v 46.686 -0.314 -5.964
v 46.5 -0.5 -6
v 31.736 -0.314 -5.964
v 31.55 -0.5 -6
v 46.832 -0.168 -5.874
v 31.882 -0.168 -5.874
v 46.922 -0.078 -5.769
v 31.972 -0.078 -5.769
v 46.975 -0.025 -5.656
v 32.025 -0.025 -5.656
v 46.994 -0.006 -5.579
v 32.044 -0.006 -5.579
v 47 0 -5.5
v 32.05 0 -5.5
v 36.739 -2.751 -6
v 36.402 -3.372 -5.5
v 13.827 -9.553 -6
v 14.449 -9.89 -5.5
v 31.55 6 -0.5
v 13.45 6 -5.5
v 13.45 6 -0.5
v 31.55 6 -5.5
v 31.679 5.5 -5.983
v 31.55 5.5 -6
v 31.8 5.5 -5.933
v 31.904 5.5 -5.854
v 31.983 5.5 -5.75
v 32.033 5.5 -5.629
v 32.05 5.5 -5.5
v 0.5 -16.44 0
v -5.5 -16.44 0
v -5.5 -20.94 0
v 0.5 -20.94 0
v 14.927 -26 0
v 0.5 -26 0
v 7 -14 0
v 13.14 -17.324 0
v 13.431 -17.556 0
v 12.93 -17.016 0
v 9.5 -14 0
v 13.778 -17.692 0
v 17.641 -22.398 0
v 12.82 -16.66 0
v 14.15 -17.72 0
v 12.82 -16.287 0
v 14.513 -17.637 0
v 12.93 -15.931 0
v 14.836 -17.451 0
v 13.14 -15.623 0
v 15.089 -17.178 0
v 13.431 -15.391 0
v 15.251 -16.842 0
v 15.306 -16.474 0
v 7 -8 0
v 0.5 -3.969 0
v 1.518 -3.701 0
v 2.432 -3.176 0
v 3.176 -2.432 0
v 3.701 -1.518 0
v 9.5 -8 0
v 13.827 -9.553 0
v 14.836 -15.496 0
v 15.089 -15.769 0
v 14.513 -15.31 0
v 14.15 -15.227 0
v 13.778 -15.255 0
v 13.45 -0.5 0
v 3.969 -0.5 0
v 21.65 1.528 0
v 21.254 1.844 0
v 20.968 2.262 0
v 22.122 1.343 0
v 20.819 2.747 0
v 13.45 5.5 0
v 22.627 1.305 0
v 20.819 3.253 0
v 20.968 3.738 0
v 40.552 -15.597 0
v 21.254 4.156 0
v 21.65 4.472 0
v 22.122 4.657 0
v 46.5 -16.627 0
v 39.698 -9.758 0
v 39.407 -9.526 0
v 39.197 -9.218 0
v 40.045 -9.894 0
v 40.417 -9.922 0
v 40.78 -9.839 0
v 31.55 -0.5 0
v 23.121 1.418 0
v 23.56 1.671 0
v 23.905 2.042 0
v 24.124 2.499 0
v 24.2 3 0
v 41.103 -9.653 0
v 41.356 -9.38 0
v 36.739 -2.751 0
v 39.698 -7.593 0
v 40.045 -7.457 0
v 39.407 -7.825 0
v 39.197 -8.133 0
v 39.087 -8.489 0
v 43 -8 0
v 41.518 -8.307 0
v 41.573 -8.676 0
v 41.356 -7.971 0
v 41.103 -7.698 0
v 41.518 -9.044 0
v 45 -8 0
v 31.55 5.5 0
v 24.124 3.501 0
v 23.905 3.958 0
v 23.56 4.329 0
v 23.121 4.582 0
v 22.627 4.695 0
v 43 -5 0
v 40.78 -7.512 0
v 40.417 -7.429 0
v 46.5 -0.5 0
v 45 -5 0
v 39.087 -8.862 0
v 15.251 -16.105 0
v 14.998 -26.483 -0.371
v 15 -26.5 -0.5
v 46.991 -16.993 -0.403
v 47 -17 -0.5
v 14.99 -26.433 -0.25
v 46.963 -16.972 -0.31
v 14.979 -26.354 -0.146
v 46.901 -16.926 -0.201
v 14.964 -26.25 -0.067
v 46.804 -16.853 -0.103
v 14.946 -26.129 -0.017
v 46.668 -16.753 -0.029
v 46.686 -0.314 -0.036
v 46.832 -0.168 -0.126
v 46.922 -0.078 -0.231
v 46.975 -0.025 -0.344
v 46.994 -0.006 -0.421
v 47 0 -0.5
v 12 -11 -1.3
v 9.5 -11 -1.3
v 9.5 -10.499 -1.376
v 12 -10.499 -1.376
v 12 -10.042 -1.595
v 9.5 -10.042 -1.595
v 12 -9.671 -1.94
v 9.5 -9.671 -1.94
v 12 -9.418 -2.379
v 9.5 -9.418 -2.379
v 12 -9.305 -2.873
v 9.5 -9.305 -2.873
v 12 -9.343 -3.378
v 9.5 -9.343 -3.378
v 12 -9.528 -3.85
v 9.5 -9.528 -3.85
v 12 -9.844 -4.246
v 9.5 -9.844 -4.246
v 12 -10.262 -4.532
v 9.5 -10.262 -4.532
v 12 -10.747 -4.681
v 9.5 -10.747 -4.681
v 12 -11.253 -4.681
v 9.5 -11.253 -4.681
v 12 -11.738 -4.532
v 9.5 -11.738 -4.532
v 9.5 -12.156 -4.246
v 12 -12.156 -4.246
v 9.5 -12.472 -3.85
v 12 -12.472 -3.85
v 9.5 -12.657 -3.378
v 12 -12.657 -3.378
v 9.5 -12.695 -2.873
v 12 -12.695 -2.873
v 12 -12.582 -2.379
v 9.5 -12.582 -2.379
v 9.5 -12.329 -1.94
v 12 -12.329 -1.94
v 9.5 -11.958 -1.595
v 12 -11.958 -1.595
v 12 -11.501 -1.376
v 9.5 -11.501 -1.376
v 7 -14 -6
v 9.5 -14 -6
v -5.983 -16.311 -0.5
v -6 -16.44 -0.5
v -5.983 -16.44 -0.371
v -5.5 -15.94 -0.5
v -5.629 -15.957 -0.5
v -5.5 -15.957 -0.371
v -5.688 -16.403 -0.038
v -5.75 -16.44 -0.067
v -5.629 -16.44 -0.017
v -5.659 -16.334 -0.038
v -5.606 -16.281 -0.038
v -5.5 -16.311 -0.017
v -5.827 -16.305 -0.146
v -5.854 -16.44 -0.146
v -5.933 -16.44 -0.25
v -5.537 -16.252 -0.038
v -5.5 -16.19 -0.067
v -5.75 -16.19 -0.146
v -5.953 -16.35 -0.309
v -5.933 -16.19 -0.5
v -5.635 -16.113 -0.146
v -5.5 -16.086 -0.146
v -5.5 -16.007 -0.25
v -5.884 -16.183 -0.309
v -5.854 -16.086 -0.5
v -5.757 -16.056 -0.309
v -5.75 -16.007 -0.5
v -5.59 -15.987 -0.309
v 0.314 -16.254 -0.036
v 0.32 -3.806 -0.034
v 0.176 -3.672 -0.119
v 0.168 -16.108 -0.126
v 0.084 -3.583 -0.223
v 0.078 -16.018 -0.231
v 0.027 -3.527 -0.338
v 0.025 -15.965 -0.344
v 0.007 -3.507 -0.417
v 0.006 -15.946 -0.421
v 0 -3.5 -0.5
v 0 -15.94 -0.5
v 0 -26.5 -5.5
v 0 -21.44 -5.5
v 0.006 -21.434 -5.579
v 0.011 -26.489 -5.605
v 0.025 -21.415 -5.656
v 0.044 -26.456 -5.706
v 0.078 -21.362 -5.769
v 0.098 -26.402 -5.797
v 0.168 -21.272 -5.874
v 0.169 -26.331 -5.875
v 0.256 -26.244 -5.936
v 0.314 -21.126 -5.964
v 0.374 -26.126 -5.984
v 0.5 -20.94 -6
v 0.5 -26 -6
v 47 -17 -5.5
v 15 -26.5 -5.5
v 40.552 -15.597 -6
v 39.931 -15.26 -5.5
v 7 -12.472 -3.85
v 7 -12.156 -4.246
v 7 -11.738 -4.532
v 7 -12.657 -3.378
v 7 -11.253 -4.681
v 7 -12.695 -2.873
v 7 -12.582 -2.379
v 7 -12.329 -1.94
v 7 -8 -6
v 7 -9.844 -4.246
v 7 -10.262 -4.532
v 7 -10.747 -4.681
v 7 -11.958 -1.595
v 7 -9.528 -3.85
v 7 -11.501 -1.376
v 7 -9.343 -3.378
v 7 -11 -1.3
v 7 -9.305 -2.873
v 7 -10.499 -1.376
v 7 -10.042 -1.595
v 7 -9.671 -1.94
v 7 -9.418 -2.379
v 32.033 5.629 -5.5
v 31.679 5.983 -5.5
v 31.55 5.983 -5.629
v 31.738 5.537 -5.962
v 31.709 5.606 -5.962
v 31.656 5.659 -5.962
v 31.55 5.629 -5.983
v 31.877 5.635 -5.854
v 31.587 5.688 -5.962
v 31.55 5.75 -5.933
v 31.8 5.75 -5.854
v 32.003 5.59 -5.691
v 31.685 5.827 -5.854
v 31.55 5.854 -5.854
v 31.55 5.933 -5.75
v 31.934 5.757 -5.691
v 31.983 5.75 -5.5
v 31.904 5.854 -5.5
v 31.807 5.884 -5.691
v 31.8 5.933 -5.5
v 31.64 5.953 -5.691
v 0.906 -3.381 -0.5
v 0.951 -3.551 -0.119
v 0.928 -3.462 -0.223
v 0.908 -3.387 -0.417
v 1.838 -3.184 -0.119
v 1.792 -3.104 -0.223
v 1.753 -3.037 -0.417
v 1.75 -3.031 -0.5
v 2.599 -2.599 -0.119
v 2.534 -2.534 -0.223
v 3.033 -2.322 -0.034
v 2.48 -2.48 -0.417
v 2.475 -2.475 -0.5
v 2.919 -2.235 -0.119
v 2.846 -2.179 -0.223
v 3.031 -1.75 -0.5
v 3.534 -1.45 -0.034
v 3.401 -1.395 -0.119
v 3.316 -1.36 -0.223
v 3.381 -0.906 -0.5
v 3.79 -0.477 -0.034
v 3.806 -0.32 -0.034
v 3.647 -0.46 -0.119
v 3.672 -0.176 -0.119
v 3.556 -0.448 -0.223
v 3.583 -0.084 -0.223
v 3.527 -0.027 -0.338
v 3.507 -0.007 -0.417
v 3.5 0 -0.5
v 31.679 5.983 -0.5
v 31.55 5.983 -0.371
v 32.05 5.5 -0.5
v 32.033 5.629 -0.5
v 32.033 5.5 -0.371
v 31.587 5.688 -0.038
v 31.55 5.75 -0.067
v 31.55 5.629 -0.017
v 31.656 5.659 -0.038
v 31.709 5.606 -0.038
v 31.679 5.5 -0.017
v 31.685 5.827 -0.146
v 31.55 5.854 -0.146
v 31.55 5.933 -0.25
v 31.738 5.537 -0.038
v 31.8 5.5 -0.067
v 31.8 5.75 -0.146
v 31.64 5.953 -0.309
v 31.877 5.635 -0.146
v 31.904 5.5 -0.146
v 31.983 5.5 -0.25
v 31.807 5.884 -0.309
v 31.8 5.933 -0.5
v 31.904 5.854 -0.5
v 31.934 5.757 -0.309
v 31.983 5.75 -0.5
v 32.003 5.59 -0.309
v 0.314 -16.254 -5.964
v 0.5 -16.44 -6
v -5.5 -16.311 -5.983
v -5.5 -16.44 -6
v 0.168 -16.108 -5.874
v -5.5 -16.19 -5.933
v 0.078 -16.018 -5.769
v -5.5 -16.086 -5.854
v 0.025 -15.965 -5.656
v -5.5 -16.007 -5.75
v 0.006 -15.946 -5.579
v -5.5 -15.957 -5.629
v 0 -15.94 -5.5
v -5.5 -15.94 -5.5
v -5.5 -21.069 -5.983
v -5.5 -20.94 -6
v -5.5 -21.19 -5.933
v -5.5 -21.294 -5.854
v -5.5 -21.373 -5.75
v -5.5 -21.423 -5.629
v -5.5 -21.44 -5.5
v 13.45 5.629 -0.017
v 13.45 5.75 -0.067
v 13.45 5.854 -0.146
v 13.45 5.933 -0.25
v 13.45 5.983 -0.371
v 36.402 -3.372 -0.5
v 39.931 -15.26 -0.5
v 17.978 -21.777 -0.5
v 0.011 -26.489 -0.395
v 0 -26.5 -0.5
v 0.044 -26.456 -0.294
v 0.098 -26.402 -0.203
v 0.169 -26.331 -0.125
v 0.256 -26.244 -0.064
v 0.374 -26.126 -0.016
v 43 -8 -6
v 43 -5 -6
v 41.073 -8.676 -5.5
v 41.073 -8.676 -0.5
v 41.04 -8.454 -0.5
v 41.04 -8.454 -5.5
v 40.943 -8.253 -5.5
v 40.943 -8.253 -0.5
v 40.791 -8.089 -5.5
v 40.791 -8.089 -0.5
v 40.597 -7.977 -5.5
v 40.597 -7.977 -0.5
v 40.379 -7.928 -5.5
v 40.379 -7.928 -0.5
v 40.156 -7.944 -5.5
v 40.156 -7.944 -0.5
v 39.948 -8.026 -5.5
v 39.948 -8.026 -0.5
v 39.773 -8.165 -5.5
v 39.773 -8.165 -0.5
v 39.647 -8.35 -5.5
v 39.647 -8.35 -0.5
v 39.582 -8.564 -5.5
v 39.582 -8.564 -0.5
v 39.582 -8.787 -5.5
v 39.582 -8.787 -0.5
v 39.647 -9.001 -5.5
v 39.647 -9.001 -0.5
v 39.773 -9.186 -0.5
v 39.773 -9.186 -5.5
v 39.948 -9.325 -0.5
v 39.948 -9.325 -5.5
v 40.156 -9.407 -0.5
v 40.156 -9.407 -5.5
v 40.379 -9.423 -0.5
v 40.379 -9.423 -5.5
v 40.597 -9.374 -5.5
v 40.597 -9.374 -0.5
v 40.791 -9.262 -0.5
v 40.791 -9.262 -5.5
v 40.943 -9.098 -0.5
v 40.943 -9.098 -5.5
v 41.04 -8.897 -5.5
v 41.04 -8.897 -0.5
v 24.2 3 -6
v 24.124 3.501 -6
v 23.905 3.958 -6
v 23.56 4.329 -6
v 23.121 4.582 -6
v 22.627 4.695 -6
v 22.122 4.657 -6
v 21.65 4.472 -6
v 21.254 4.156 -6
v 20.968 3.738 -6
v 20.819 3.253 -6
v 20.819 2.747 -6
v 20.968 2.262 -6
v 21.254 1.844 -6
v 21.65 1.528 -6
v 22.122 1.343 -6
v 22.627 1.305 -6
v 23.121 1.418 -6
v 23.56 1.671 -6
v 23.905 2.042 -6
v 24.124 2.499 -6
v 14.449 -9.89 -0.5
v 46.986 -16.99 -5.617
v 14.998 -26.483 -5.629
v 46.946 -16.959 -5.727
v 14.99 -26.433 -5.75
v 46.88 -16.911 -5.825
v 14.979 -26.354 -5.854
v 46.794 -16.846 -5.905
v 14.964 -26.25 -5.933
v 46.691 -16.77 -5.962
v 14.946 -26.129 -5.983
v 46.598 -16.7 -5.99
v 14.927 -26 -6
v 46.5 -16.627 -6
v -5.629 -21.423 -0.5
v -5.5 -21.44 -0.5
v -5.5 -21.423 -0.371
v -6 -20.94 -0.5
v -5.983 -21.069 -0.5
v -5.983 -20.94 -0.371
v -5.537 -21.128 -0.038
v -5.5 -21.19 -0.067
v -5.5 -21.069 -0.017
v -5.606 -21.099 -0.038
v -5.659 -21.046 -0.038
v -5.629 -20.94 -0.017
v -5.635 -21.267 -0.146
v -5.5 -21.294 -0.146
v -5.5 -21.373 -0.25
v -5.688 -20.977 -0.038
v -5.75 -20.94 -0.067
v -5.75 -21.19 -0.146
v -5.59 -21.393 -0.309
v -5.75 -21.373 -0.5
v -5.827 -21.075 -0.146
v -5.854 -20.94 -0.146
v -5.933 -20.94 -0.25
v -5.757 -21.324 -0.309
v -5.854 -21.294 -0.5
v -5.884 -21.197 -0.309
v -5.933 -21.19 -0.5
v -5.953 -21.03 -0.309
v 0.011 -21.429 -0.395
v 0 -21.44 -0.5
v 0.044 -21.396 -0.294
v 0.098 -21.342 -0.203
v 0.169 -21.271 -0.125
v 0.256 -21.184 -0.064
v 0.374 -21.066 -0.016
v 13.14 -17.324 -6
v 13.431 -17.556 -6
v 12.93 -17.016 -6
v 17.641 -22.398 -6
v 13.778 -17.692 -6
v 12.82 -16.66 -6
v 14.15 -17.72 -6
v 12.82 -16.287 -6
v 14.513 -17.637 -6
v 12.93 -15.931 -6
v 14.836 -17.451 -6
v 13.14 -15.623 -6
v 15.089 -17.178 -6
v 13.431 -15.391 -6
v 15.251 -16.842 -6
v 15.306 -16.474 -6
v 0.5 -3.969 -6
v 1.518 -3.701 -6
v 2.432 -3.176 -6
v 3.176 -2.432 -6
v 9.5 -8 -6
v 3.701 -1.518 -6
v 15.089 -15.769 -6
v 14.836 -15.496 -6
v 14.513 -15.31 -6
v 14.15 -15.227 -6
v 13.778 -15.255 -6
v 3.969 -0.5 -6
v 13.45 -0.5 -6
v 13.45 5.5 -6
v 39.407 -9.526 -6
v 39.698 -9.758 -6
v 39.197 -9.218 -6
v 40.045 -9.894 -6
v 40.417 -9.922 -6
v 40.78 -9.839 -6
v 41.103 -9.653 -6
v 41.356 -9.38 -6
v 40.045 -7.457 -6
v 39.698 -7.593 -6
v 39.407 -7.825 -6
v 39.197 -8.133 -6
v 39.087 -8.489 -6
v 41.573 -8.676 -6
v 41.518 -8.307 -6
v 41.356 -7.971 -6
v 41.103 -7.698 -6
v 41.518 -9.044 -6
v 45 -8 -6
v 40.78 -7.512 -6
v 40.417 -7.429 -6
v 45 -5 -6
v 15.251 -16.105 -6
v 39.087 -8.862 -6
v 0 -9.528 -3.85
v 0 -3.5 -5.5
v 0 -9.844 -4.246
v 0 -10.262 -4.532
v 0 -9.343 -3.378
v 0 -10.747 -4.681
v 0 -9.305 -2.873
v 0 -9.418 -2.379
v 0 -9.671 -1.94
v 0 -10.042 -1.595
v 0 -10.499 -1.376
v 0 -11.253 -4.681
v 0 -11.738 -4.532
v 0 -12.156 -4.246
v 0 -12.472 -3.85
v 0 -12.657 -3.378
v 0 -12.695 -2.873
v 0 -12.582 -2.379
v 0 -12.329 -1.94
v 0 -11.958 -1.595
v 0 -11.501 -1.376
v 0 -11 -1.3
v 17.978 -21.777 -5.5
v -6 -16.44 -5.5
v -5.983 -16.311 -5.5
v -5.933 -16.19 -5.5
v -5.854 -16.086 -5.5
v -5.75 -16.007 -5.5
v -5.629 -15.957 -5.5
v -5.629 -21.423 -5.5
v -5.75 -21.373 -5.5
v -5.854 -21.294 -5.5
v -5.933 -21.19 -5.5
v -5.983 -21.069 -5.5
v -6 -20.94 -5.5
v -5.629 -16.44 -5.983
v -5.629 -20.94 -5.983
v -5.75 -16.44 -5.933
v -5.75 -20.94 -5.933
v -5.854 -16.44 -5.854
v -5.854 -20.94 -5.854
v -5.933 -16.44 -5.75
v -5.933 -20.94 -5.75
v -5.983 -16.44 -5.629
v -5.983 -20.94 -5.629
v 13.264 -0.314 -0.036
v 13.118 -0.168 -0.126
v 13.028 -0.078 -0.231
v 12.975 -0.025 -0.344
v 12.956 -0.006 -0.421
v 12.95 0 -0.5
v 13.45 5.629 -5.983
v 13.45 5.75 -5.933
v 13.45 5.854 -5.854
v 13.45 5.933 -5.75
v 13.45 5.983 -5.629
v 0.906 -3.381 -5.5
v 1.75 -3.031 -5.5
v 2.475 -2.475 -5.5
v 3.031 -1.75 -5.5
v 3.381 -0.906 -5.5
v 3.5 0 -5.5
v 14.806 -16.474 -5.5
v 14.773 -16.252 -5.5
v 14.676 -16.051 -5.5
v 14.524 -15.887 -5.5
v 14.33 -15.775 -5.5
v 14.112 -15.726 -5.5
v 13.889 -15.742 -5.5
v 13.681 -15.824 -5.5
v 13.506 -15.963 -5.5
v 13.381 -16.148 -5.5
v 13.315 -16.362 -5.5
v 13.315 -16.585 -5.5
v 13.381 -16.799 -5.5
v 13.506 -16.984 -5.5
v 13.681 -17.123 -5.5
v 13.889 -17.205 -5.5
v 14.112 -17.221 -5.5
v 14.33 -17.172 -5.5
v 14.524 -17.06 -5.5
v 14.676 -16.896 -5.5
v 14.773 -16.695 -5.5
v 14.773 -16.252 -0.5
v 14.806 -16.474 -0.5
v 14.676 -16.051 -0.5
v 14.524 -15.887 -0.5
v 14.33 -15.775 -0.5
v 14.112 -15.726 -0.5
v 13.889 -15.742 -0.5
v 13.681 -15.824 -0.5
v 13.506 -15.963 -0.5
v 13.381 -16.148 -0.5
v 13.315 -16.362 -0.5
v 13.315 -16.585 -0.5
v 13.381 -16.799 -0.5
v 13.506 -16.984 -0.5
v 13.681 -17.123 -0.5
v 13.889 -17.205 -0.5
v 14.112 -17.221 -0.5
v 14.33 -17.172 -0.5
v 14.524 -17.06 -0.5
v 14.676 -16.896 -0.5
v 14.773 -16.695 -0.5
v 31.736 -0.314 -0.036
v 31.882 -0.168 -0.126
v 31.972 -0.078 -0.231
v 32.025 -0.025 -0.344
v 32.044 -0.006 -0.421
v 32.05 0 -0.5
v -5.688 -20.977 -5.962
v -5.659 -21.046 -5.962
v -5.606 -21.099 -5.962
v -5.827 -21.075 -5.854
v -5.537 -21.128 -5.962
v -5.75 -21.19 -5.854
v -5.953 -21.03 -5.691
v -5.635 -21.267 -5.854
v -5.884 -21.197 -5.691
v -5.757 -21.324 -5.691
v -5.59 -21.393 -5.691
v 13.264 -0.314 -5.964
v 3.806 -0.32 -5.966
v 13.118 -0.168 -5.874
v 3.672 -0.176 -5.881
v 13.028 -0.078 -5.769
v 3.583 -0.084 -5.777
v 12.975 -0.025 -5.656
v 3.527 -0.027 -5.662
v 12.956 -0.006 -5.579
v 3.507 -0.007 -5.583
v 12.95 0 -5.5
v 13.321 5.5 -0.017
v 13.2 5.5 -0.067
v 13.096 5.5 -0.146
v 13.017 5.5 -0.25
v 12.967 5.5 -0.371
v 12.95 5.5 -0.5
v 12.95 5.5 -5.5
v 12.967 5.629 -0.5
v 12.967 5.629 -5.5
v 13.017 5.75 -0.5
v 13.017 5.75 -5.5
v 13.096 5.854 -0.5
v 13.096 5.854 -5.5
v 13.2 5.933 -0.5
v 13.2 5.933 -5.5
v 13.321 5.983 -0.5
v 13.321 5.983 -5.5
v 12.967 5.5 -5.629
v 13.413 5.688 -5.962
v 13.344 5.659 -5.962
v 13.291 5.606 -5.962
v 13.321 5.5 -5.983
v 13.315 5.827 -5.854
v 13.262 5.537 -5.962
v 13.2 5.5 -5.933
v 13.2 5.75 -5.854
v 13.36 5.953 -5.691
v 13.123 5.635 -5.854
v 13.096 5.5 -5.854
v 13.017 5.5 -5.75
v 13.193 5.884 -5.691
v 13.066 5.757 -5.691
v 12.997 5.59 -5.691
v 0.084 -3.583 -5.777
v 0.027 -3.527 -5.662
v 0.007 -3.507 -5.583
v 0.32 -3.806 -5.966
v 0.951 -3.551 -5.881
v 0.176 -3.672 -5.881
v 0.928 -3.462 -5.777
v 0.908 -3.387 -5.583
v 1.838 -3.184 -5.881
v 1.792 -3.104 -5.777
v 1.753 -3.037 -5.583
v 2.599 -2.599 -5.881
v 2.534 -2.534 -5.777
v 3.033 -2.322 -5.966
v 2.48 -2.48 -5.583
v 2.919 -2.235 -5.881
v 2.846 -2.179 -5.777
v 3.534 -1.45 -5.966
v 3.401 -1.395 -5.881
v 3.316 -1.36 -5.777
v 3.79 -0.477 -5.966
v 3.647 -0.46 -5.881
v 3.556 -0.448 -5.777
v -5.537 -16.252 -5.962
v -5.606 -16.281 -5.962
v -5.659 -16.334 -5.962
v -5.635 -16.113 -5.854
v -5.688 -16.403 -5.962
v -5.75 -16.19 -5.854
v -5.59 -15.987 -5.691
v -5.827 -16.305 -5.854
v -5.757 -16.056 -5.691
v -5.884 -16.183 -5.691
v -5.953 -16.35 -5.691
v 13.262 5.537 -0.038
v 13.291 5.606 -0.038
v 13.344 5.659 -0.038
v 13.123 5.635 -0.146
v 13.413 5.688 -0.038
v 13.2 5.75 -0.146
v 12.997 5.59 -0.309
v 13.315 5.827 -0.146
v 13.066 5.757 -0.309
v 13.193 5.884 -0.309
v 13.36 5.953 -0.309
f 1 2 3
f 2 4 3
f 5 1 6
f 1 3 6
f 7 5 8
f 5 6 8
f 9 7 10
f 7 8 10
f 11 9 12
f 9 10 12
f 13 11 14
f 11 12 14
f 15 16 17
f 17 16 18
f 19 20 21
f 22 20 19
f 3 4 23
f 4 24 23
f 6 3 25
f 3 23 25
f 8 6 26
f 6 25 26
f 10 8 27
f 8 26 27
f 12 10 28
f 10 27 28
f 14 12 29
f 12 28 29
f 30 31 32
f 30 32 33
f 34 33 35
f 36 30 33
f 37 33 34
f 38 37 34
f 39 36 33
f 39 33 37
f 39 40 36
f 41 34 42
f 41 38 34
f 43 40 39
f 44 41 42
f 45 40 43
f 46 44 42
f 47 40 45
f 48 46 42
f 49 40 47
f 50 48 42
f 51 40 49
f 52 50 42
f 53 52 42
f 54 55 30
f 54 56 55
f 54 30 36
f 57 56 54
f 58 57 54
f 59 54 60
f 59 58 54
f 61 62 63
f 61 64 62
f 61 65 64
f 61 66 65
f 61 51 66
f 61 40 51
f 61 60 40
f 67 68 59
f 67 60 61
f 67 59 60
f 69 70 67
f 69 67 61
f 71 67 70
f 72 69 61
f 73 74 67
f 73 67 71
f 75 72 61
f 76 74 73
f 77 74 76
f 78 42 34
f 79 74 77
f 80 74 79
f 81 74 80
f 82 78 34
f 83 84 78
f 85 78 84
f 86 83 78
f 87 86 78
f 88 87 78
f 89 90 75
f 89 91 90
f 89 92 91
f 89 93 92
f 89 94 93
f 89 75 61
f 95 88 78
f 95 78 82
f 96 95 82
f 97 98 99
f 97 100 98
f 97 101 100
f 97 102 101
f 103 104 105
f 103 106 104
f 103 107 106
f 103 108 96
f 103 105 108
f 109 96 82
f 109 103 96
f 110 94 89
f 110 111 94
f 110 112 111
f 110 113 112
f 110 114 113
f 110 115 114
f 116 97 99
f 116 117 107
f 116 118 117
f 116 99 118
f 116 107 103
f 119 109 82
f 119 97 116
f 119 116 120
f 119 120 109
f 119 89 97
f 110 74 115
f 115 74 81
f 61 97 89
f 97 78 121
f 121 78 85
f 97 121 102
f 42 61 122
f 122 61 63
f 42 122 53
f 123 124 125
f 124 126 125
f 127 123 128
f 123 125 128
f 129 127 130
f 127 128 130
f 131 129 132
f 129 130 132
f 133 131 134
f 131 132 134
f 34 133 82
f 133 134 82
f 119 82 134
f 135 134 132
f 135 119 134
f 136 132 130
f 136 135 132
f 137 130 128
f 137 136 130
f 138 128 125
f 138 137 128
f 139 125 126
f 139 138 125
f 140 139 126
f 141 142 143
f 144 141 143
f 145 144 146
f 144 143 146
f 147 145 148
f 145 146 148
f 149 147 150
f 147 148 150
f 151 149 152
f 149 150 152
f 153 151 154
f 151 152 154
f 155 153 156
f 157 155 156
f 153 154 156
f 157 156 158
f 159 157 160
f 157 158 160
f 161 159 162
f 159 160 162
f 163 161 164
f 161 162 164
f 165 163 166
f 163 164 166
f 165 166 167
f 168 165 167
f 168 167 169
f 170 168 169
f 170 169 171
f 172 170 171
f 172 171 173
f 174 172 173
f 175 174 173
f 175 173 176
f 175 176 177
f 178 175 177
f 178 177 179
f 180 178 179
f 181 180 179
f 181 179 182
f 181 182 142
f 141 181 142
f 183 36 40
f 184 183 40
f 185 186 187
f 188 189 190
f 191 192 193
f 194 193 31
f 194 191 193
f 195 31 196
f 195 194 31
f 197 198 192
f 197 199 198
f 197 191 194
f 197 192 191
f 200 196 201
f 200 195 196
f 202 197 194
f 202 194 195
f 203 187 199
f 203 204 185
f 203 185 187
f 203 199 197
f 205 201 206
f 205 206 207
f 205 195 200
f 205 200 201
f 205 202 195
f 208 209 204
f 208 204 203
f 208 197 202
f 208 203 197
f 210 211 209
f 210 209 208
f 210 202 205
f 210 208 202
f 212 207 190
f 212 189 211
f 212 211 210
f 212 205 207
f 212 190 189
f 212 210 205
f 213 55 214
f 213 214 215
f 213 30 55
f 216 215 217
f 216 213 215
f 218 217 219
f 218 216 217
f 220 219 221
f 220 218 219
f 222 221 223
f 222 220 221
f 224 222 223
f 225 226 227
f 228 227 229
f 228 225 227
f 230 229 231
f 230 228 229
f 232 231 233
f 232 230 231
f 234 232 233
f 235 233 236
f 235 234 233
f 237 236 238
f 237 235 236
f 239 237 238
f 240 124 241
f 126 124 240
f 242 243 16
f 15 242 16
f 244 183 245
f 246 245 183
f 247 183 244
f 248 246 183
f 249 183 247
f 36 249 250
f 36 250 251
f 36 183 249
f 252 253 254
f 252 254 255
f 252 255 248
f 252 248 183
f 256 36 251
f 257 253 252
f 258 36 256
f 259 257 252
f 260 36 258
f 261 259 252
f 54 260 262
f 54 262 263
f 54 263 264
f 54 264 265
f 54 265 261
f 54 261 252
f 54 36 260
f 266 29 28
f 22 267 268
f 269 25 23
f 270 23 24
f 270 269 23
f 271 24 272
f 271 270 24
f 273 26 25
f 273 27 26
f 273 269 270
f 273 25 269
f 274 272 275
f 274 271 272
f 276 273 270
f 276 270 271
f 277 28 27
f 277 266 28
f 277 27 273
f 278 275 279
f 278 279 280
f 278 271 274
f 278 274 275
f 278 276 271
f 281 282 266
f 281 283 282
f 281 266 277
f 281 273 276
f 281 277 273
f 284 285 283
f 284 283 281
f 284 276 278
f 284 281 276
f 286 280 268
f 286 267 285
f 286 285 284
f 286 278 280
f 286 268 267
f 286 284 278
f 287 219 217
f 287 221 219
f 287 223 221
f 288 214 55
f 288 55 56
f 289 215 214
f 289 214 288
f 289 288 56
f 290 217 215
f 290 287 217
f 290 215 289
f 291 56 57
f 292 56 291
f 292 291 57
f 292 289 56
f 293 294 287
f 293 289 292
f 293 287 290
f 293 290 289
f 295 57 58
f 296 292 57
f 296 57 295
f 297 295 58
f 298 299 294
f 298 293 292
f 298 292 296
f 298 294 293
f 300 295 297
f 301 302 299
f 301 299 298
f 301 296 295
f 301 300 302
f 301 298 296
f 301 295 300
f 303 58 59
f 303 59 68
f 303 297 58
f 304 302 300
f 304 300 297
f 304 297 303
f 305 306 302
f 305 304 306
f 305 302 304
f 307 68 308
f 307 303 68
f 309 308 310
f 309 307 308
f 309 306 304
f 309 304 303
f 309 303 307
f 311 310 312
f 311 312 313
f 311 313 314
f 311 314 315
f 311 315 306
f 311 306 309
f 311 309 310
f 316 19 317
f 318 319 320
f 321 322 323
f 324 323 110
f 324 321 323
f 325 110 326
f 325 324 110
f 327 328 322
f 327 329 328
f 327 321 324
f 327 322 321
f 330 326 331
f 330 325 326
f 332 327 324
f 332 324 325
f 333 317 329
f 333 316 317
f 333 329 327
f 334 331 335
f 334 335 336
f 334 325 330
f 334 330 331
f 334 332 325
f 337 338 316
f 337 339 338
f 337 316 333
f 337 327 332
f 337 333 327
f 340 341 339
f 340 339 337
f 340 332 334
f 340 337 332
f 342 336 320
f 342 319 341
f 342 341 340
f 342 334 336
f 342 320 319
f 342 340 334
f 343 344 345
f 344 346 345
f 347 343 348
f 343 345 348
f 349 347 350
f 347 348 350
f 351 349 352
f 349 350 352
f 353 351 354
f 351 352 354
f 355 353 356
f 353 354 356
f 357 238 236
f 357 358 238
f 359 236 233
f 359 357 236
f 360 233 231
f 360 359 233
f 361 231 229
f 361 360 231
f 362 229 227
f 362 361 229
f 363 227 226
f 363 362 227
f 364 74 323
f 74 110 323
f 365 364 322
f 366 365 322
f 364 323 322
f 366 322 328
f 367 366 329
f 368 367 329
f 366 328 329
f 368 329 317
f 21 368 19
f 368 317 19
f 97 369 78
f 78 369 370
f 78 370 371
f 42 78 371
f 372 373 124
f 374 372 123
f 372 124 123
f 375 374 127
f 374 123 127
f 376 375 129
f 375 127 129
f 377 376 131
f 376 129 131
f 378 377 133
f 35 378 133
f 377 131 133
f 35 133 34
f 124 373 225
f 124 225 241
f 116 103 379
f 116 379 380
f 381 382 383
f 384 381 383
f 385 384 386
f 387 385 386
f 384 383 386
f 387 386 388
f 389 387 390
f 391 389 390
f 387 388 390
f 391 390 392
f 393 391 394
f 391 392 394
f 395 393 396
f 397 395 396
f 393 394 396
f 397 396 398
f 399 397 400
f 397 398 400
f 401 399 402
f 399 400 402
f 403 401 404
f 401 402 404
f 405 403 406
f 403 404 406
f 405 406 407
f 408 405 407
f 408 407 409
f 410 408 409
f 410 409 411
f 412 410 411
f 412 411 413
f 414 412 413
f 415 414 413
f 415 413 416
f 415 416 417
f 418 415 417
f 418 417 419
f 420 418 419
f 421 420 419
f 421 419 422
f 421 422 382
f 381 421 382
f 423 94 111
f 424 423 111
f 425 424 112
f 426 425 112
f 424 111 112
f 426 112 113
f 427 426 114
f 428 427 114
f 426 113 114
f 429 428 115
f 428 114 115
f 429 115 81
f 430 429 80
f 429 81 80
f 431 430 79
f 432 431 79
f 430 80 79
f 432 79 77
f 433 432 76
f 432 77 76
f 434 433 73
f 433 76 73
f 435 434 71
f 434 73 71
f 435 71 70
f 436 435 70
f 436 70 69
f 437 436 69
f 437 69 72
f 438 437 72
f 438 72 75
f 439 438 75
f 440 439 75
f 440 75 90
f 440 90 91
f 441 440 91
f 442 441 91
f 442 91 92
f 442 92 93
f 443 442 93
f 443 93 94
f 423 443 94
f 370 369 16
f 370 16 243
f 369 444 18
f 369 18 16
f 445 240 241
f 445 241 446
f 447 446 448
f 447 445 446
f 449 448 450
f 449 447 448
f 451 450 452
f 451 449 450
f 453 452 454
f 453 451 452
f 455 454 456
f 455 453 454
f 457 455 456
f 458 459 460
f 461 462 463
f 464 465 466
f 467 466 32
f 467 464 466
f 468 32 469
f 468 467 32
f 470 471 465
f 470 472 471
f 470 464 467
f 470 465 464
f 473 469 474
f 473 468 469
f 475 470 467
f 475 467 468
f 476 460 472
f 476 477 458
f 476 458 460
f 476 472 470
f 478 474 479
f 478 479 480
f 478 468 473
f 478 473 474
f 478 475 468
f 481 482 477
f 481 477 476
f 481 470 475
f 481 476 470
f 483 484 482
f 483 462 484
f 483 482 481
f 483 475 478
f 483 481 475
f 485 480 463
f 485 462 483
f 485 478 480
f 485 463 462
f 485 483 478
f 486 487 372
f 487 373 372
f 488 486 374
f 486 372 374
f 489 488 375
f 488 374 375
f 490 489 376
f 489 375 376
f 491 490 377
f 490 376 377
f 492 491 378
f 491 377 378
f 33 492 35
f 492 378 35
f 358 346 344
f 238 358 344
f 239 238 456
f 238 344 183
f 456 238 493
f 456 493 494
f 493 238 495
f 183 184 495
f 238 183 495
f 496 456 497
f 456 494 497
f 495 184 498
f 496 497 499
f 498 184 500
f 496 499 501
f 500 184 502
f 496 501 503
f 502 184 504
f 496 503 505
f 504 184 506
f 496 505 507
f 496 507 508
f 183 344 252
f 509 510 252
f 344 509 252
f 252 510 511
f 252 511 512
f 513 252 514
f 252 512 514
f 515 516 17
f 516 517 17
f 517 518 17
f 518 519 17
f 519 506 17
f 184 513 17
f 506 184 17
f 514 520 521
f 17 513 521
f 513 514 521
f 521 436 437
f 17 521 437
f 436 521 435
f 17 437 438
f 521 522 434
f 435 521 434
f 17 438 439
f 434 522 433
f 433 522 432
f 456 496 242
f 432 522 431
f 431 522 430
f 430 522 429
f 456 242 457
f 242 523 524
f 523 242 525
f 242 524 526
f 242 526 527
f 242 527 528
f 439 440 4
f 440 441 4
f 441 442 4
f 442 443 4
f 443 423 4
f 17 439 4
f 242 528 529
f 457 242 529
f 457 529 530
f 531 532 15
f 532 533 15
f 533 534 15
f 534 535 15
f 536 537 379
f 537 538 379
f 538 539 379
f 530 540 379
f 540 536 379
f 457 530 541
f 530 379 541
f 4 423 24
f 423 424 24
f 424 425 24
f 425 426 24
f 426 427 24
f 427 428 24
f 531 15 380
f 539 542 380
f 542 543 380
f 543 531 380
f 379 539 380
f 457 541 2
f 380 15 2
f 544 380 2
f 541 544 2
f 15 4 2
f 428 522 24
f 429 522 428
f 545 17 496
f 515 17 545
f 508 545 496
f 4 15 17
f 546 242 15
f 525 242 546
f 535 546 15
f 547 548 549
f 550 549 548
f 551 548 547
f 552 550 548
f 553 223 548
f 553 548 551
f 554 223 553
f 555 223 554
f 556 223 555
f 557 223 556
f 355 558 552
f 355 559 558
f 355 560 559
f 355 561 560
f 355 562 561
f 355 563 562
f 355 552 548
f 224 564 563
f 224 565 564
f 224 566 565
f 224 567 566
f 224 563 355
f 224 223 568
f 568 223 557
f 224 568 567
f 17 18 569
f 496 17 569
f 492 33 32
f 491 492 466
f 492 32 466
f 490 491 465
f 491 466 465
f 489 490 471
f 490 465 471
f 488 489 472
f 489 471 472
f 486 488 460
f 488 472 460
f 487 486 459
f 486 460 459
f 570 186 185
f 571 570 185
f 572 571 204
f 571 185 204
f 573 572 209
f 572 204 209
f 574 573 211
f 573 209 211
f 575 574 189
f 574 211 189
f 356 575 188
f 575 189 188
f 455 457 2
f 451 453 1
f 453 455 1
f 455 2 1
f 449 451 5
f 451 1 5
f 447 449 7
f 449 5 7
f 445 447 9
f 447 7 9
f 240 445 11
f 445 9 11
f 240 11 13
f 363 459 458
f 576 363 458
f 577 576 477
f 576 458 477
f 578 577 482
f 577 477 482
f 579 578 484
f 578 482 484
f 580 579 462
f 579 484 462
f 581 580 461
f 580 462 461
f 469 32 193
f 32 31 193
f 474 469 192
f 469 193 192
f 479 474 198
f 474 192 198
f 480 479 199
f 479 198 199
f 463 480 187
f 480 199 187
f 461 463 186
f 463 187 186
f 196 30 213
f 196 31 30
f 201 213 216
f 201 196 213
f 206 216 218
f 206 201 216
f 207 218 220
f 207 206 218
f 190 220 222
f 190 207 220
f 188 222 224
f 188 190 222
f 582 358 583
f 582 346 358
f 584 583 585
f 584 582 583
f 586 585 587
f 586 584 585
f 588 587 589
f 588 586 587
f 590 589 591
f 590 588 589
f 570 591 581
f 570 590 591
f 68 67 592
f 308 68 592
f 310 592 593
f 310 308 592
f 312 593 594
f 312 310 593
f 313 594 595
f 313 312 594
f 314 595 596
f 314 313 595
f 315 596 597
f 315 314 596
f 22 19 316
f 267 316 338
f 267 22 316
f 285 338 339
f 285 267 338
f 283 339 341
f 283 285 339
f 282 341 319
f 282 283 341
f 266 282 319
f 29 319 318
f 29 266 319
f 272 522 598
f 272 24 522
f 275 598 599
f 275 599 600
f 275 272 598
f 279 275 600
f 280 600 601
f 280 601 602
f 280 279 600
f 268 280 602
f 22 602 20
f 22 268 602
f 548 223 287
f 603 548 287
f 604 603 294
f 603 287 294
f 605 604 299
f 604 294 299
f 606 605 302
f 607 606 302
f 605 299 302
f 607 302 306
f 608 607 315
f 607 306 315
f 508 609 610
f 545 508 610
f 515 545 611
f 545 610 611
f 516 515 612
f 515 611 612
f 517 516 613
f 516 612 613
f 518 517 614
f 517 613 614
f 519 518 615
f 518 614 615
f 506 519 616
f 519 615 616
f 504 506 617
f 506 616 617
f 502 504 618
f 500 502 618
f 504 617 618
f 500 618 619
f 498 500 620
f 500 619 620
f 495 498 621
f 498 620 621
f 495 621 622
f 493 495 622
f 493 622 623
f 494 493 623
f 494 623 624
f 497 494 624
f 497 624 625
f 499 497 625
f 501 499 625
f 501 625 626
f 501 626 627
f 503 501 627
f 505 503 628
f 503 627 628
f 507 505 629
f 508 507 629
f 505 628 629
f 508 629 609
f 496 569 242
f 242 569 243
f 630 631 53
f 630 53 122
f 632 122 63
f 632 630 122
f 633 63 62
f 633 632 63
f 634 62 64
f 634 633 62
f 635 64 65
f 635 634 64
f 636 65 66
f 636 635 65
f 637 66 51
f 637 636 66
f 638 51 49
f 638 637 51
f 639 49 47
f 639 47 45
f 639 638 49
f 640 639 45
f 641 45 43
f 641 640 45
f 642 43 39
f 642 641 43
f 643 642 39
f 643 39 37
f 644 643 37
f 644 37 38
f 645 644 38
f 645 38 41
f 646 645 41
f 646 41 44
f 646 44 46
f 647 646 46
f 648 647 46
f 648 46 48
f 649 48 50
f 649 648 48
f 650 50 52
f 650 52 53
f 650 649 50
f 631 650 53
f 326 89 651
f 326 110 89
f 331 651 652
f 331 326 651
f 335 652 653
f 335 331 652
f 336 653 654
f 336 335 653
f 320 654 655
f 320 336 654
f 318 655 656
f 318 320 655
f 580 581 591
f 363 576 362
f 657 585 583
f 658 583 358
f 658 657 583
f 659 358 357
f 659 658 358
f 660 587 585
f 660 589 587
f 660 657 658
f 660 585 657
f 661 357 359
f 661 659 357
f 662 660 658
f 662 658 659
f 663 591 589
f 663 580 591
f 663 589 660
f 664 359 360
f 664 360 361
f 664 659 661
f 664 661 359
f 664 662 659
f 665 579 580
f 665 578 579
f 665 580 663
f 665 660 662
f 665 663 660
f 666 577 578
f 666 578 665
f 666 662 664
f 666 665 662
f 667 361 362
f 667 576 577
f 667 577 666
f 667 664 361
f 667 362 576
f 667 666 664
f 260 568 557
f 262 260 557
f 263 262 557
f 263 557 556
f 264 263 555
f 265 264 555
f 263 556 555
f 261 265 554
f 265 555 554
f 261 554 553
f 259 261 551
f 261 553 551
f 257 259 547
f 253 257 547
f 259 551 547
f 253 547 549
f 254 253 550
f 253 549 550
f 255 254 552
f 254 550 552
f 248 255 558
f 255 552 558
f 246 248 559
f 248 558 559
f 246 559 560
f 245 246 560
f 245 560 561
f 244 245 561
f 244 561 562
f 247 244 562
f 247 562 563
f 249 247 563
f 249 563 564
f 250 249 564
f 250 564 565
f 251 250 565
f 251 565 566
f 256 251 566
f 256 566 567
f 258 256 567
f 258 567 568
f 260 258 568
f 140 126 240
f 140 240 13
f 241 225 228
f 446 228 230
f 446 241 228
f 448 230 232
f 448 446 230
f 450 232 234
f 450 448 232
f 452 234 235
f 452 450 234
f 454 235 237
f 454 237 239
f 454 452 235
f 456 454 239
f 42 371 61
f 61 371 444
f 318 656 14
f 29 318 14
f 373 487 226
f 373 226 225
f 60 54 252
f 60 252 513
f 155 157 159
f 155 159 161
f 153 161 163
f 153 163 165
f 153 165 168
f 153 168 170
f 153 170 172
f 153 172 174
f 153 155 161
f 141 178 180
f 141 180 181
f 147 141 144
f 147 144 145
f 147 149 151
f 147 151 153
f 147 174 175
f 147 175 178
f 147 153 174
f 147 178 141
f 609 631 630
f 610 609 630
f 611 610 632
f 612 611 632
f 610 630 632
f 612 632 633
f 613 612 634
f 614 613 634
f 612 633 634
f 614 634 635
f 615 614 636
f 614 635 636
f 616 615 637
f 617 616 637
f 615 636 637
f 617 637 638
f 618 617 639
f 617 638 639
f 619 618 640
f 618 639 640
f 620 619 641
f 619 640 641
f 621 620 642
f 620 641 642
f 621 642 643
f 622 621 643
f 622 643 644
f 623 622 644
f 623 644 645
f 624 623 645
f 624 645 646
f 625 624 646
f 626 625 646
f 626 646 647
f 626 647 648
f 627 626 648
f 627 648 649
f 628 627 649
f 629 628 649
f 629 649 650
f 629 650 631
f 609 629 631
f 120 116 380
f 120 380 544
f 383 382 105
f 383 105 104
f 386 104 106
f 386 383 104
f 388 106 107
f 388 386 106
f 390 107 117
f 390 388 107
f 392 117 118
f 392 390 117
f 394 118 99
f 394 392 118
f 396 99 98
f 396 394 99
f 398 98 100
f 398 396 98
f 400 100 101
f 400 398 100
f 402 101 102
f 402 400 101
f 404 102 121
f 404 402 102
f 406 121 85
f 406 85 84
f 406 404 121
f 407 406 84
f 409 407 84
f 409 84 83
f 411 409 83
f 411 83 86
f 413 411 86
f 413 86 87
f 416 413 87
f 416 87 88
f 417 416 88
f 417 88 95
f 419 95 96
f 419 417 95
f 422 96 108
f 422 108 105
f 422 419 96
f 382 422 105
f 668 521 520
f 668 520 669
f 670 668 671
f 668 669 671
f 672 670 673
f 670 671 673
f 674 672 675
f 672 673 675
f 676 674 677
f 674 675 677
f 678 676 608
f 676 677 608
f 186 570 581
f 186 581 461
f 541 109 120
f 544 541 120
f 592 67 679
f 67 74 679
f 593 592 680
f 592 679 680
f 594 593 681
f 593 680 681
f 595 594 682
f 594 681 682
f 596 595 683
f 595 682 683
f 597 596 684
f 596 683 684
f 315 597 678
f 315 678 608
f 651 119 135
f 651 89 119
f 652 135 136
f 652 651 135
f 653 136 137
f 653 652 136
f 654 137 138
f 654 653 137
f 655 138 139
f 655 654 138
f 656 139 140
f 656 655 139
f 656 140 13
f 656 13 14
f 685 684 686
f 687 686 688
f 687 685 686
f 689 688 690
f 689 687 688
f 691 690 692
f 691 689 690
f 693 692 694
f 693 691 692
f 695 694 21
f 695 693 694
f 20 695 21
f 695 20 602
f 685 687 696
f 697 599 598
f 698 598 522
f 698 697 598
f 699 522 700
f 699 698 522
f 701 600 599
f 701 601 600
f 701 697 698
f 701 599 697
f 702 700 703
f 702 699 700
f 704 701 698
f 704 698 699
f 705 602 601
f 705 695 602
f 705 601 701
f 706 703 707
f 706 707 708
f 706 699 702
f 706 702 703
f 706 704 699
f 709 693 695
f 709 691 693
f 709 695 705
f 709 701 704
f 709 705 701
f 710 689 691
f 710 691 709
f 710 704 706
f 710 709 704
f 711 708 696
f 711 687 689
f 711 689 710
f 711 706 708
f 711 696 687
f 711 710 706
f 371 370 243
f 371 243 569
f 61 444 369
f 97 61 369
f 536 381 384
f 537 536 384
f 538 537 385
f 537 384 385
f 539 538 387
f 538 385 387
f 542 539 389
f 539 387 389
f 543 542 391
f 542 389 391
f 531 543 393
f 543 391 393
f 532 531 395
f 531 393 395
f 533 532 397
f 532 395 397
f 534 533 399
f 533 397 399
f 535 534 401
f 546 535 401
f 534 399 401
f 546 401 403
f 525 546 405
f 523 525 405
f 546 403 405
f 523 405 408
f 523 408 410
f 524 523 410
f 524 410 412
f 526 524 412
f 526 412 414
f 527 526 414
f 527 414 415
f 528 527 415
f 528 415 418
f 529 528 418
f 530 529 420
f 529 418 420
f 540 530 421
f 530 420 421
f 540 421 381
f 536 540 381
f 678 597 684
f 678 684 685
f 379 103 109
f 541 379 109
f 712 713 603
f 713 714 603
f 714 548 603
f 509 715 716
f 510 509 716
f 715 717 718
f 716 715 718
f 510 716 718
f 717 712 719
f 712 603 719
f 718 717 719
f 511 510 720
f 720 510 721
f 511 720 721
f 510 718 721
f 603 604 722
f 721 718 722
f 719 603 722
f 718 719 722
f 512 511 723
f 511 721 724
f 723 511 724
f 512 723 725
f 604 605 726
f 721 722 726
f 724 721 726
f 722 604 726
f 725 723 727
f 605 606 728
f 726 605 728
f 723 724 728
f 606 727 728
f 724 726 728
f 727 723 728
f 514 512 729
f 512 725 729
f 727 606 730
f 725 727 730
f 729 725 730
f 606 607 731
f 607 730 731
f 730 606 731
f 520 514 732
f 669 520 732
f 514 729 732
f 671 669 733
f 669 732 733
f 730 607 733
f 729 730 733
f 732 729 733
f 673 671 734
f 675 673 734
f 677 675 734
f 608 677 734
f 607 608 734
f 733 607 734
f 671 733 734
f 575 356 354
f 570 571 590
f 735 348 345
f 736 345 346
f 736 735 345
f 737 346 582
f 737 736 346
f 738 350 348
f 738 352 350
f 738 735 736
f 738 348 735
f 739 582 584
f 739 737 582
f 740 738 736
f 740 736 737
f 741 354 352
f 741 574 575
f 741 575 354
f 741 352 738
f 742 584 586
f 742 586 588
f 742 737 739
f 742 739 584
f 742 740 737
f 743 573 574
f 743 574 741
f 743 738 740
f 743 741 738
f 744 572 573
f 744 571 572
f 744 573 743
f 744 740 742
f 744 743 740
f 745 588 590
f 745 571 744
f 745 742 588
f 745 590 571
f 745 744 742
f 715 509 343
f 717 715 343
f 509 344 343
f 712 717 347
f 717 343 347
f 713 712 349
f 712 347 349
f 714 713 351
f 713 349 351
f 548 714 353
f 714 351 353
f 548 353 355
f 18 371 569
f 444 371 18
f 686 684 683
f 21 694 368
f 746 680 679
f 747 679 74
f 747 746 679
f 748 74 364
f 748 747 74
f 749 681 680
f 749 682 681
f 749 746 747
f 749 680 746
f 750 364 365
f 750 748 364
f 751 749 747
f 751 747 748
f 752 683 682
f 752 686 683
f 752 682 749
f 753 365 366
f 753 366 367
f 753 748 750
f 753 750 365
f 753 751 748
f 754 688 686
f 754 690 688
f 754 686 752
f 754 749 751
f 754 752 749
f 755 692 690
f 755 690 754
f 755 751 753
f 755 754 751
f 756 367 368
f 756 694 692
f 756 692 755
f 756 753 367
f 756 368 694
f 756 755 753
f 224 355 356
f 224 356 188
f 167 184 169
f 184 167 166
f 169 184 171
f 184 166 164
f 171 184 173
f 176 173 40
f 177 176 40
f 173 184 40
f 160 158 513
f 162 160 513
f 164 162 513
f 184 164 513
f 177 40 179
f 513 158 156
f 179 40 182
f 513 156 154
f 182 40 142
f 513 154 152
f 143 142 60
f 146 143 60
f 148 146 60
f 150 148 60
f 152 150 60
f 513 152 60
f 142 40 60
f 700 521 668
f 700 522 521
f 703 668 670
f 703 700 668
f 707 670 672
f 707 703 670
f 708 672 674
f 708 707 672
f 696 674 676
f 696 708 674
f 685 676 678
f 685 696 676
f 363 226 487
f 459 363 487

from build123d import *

# Parameters (mm, degrees)
BODY_DEPTH                = 6
SKETCH2_W                 = 19.1
SKETCH2_H                 = 6
TOP_TAB_DEPTH             = 6
SKETCH3_W                 = 6
SKETCH3_H                 = 5.5
BACK_TAB_DEPTH            = 6
SKETCH5_R                 = 1.7
BACK_SCREW_HOLE_DEPTH     = 12
SCREW_AND_NUT_HOLES_REACH = 56.289
SKETCH4_R                 = 1.7
SKETCH4_W                 = 2.5
SKETCH4_H                 = 6
SKETCH7_R                 = 3.5
SWITCH_WIRE_RELIEF_DEPTH  = 55.288580751
FILLET1_R                 = 0.5
SERVO_OPENINGS_REACH      = 56.289
SKETCH6_R                 = 0.75
CHAMFER1_SIZE             = 0.5
SKETCH8_W                 = 2
SKETCH8_H                 = 3
CUT_EXTRUDE1_DEPTH        = 55.288580762


with BuildPart() as part:
    # Sketch1 → Body (new body)
    with BuildSketch(Plane.XY):
        Polygon((0, -26.5), (15, -26.5), (47, -17), (47, 0), (0, 0), align=None)
    extrude(amount=-BODY_DEPTH)

    # Sketch2 → Top Tab (add)
    with BuildSketch(Plane(origin=(0, 0, 0), x_dir=(1, 0, 0), z_dir=(0, 1, 0))):
        with Locations((22.5, 3)):
            Rectangle(SKETCH2_W, SKETCH2_H)
    extrude(amount=TOP_TAB_DEPTH)

    # Sketch3 → Back Tab (add)
    with BuildSketch(Plane.ZY):
        with Locations((-3, -18.69)):
            Rectangle(SKETCH3_W, SKETCH3_H)
    extrude(amount=BACK_TAB_DEPTH)

    # Sketch5 → Back Screw Hole (cut)
    with BuildSketch(Plane.ZY):
        with Locations((-3, -11)):
            Circle(SKETCH5_R)
    extrude(amount=-BACK_SCREW_HOLE_DEPTH, mode=Mode.SUBTRACT)

    # Sketch4 → Screw and Nut Holes (cut, up to next)
    with BuildSketch(Plane.XY, mode=Mode.PRIVATE) as screw_and_nut_holes_sk1:
        with Locations((22.5, 3)):
            Circle(SKETCH4_R)
    screw_and_nut_holes_tool1 = extrude(screw_and_nut_holes_sk1.sketch, amount=-SCREW_AND_NUT_HOLES_REACH, mode=Mode.PRIVATE) & part.part
    # Sketch4 → Screw and Nut Holes (cut, up to next)
    with BuildSketch(Plane.XY, mode=Mode.PRIVATE) as screw_and_nut_holes_sk2:
        with Locations((8.25, -11)):
            Rectangle(SKETCH4_W, SKETCH4_H)
    screw_and_nut_holes_tool2 = extrude(screw_and_nut_holes_sk2.sketch, amount=-SCREW_AND_NUT_HOLES_REACH, mode=Mode.PRIVATE) & part.part
    add(screw_and_nut_holes_tool1.solids().sort_by_distance((22.5, 3, 0))[0], mode=Mode.SUBTRACT)
    add(screw_and_nut_holes_tool2.solids().sort_by_distance((8.25, -11, 0))[0], mode=Mode.SUBTRACT)

    # Sketch7 → Switch Wire Relief (cut, through all)
    with BuildSketch(Plane.XY):
        Circle(SKETCH7_R)
    extrude(amount=-SWITCH_WIRE_RELIEF_DEPTH, mode=Mode.SUBTRACT)

    # Fillet1
    fillet1_edges = [part.edges().sort_by_distance(p)[0] for p in [
        (32.05, 6, -3),
        (12.95, 6, -3),
        (-6, -15.94, -3),
        (-6, -21.44, -3),
        (7.5, -26.5, -6),
        (31, -21.75, -6),
        (47, -8.5, -6),
        (39.525, 0, -6),
        (32.05, 3, -6),
        (22.5, 6, -6),
        (12.95, 3, -6),
        (8.225, 0, -6),
        (0, -9.72, -6),
        (-3, -15.94, -6),
        (-6, -18.69, -6),
        (-3, -21.44, -6),
        (0, -23.97, -6),
        (0, -9.72, 0),
        (8.225, 0, 0),
        (12.95, 3, 0),
        (22.5, 6, 0),
        (32.05, 3, 0),
        (39.525, 0, 0),
        (47, -8.5, 0),
        (31, -21.75, 0),
        (7.5, -26.5, 0),
        (0, -23.97, 0),
        (-3, -21.44, 0),
        (-6, -18.69, 0),
        (-3, -15.94, 0),
        (2.474873734, -2.474873734, -6),
        (2.474873734, -2.474873734, 0),
    ]]
    fillet(fillet1_edges, radius=FILLET1_R)

    # Sketch6 → Servo Openings (cut, up to next)
    with BuildSketch(Plane.XY, mode=Mode.PRIVATE) as servo_openings_sk1:
        with Locations((14.056274553, -16.473540836)):
            Circle(SKETCH6_R)
    servo_openings_tool1 = extrude(servo_openings_sk1.sketch, amount=-SERVO_OPENINGS_REACH, mode=Mode.PRIVATE) & part.part
    # Sketch6 → Servo Openings (cut, up to next)
    with BuildSketch(Plane.XY, mode=Mode.PRIVATE) as servo_openings_sk2:
        with Locations((40.323198689, -8.675547733)):
            Circle(SKETCH6_R)
    servo_openings_tool2 = extrude(servo_openings_sk2.sketch, amount=-SERVO_OPENINGS_REACH, mode=Mode.PRIVATE) & part.part
    # Sketch6 → Servo Openings (cut, up to next)
    with BuildSketch(Plane.XY, mode=Mode.PRIVATE) as servo_openings_sk3:
        Polygon((36.401733852, -3.372283311), (39.930752628, -15.259504453), (17.97773939, -21.776805258), (14.448720614, -9.889584116), align=None)
    servo_openings_tool3 = extrude(servo_openings_sk3.sketch, amount=-SERVO_OPENINGS_REACH, mode=Mode.PRIVATE) & part.part
    add(servo_openings_tool1.solids().sort_by_distance((14.056275, -16.473541, 0))[0], mode=Mode.SUBTRACT)
    add(servo_openings_tool2.solids().sort_by_distance((40.323199, -8.675548, 0))[0], mode=Mode.SUBTRACT)
    add(servo_openings_tool3.solids().sort_by_distance((27.189737, -12.574544, 0))[0], mode=Mode.SUBTRACT)

    # Chamfer1
    chamfer1_edges = [part.edges().sort_by_distance(p)[0] for p in [
        (39.573198689, -8.675547733, -6),
        (13.306274553, -16.473540836, -6),
        (16.213230002, -15.833194687, -6),
        (25.425227233, -6.630933714, -6),
        (38.16624324, -9.315893882, -6),
        (28.954246009, -18.518154856, -6),
        (13.306274553, -16.473540836, 0),
        (39.573198689, -8.675547733, 0),
        (16.213230002, -15.833194687, 0),
        (25.425227233, -6.630933714, 0),
        (38.16624324, -9.315893882, 0),
        (28.954246009, -18.518154856, 0),
    ]]
    chamfer(chamfer1_edges, length=CHAMFER1_SIZE)

    # Sketch8 → Cut-Extrude1 (cut, through all)
    with BuildSketch(Plane.XY):
        with Locations((44, -6.5)):
            Rectangle(SKETCH8_W, SKETCH8_H)
    extrude(amount=-CUT_EXTRUDE1_DEPTH, mode=Mode.SUBTRACT)


solid = part.part
